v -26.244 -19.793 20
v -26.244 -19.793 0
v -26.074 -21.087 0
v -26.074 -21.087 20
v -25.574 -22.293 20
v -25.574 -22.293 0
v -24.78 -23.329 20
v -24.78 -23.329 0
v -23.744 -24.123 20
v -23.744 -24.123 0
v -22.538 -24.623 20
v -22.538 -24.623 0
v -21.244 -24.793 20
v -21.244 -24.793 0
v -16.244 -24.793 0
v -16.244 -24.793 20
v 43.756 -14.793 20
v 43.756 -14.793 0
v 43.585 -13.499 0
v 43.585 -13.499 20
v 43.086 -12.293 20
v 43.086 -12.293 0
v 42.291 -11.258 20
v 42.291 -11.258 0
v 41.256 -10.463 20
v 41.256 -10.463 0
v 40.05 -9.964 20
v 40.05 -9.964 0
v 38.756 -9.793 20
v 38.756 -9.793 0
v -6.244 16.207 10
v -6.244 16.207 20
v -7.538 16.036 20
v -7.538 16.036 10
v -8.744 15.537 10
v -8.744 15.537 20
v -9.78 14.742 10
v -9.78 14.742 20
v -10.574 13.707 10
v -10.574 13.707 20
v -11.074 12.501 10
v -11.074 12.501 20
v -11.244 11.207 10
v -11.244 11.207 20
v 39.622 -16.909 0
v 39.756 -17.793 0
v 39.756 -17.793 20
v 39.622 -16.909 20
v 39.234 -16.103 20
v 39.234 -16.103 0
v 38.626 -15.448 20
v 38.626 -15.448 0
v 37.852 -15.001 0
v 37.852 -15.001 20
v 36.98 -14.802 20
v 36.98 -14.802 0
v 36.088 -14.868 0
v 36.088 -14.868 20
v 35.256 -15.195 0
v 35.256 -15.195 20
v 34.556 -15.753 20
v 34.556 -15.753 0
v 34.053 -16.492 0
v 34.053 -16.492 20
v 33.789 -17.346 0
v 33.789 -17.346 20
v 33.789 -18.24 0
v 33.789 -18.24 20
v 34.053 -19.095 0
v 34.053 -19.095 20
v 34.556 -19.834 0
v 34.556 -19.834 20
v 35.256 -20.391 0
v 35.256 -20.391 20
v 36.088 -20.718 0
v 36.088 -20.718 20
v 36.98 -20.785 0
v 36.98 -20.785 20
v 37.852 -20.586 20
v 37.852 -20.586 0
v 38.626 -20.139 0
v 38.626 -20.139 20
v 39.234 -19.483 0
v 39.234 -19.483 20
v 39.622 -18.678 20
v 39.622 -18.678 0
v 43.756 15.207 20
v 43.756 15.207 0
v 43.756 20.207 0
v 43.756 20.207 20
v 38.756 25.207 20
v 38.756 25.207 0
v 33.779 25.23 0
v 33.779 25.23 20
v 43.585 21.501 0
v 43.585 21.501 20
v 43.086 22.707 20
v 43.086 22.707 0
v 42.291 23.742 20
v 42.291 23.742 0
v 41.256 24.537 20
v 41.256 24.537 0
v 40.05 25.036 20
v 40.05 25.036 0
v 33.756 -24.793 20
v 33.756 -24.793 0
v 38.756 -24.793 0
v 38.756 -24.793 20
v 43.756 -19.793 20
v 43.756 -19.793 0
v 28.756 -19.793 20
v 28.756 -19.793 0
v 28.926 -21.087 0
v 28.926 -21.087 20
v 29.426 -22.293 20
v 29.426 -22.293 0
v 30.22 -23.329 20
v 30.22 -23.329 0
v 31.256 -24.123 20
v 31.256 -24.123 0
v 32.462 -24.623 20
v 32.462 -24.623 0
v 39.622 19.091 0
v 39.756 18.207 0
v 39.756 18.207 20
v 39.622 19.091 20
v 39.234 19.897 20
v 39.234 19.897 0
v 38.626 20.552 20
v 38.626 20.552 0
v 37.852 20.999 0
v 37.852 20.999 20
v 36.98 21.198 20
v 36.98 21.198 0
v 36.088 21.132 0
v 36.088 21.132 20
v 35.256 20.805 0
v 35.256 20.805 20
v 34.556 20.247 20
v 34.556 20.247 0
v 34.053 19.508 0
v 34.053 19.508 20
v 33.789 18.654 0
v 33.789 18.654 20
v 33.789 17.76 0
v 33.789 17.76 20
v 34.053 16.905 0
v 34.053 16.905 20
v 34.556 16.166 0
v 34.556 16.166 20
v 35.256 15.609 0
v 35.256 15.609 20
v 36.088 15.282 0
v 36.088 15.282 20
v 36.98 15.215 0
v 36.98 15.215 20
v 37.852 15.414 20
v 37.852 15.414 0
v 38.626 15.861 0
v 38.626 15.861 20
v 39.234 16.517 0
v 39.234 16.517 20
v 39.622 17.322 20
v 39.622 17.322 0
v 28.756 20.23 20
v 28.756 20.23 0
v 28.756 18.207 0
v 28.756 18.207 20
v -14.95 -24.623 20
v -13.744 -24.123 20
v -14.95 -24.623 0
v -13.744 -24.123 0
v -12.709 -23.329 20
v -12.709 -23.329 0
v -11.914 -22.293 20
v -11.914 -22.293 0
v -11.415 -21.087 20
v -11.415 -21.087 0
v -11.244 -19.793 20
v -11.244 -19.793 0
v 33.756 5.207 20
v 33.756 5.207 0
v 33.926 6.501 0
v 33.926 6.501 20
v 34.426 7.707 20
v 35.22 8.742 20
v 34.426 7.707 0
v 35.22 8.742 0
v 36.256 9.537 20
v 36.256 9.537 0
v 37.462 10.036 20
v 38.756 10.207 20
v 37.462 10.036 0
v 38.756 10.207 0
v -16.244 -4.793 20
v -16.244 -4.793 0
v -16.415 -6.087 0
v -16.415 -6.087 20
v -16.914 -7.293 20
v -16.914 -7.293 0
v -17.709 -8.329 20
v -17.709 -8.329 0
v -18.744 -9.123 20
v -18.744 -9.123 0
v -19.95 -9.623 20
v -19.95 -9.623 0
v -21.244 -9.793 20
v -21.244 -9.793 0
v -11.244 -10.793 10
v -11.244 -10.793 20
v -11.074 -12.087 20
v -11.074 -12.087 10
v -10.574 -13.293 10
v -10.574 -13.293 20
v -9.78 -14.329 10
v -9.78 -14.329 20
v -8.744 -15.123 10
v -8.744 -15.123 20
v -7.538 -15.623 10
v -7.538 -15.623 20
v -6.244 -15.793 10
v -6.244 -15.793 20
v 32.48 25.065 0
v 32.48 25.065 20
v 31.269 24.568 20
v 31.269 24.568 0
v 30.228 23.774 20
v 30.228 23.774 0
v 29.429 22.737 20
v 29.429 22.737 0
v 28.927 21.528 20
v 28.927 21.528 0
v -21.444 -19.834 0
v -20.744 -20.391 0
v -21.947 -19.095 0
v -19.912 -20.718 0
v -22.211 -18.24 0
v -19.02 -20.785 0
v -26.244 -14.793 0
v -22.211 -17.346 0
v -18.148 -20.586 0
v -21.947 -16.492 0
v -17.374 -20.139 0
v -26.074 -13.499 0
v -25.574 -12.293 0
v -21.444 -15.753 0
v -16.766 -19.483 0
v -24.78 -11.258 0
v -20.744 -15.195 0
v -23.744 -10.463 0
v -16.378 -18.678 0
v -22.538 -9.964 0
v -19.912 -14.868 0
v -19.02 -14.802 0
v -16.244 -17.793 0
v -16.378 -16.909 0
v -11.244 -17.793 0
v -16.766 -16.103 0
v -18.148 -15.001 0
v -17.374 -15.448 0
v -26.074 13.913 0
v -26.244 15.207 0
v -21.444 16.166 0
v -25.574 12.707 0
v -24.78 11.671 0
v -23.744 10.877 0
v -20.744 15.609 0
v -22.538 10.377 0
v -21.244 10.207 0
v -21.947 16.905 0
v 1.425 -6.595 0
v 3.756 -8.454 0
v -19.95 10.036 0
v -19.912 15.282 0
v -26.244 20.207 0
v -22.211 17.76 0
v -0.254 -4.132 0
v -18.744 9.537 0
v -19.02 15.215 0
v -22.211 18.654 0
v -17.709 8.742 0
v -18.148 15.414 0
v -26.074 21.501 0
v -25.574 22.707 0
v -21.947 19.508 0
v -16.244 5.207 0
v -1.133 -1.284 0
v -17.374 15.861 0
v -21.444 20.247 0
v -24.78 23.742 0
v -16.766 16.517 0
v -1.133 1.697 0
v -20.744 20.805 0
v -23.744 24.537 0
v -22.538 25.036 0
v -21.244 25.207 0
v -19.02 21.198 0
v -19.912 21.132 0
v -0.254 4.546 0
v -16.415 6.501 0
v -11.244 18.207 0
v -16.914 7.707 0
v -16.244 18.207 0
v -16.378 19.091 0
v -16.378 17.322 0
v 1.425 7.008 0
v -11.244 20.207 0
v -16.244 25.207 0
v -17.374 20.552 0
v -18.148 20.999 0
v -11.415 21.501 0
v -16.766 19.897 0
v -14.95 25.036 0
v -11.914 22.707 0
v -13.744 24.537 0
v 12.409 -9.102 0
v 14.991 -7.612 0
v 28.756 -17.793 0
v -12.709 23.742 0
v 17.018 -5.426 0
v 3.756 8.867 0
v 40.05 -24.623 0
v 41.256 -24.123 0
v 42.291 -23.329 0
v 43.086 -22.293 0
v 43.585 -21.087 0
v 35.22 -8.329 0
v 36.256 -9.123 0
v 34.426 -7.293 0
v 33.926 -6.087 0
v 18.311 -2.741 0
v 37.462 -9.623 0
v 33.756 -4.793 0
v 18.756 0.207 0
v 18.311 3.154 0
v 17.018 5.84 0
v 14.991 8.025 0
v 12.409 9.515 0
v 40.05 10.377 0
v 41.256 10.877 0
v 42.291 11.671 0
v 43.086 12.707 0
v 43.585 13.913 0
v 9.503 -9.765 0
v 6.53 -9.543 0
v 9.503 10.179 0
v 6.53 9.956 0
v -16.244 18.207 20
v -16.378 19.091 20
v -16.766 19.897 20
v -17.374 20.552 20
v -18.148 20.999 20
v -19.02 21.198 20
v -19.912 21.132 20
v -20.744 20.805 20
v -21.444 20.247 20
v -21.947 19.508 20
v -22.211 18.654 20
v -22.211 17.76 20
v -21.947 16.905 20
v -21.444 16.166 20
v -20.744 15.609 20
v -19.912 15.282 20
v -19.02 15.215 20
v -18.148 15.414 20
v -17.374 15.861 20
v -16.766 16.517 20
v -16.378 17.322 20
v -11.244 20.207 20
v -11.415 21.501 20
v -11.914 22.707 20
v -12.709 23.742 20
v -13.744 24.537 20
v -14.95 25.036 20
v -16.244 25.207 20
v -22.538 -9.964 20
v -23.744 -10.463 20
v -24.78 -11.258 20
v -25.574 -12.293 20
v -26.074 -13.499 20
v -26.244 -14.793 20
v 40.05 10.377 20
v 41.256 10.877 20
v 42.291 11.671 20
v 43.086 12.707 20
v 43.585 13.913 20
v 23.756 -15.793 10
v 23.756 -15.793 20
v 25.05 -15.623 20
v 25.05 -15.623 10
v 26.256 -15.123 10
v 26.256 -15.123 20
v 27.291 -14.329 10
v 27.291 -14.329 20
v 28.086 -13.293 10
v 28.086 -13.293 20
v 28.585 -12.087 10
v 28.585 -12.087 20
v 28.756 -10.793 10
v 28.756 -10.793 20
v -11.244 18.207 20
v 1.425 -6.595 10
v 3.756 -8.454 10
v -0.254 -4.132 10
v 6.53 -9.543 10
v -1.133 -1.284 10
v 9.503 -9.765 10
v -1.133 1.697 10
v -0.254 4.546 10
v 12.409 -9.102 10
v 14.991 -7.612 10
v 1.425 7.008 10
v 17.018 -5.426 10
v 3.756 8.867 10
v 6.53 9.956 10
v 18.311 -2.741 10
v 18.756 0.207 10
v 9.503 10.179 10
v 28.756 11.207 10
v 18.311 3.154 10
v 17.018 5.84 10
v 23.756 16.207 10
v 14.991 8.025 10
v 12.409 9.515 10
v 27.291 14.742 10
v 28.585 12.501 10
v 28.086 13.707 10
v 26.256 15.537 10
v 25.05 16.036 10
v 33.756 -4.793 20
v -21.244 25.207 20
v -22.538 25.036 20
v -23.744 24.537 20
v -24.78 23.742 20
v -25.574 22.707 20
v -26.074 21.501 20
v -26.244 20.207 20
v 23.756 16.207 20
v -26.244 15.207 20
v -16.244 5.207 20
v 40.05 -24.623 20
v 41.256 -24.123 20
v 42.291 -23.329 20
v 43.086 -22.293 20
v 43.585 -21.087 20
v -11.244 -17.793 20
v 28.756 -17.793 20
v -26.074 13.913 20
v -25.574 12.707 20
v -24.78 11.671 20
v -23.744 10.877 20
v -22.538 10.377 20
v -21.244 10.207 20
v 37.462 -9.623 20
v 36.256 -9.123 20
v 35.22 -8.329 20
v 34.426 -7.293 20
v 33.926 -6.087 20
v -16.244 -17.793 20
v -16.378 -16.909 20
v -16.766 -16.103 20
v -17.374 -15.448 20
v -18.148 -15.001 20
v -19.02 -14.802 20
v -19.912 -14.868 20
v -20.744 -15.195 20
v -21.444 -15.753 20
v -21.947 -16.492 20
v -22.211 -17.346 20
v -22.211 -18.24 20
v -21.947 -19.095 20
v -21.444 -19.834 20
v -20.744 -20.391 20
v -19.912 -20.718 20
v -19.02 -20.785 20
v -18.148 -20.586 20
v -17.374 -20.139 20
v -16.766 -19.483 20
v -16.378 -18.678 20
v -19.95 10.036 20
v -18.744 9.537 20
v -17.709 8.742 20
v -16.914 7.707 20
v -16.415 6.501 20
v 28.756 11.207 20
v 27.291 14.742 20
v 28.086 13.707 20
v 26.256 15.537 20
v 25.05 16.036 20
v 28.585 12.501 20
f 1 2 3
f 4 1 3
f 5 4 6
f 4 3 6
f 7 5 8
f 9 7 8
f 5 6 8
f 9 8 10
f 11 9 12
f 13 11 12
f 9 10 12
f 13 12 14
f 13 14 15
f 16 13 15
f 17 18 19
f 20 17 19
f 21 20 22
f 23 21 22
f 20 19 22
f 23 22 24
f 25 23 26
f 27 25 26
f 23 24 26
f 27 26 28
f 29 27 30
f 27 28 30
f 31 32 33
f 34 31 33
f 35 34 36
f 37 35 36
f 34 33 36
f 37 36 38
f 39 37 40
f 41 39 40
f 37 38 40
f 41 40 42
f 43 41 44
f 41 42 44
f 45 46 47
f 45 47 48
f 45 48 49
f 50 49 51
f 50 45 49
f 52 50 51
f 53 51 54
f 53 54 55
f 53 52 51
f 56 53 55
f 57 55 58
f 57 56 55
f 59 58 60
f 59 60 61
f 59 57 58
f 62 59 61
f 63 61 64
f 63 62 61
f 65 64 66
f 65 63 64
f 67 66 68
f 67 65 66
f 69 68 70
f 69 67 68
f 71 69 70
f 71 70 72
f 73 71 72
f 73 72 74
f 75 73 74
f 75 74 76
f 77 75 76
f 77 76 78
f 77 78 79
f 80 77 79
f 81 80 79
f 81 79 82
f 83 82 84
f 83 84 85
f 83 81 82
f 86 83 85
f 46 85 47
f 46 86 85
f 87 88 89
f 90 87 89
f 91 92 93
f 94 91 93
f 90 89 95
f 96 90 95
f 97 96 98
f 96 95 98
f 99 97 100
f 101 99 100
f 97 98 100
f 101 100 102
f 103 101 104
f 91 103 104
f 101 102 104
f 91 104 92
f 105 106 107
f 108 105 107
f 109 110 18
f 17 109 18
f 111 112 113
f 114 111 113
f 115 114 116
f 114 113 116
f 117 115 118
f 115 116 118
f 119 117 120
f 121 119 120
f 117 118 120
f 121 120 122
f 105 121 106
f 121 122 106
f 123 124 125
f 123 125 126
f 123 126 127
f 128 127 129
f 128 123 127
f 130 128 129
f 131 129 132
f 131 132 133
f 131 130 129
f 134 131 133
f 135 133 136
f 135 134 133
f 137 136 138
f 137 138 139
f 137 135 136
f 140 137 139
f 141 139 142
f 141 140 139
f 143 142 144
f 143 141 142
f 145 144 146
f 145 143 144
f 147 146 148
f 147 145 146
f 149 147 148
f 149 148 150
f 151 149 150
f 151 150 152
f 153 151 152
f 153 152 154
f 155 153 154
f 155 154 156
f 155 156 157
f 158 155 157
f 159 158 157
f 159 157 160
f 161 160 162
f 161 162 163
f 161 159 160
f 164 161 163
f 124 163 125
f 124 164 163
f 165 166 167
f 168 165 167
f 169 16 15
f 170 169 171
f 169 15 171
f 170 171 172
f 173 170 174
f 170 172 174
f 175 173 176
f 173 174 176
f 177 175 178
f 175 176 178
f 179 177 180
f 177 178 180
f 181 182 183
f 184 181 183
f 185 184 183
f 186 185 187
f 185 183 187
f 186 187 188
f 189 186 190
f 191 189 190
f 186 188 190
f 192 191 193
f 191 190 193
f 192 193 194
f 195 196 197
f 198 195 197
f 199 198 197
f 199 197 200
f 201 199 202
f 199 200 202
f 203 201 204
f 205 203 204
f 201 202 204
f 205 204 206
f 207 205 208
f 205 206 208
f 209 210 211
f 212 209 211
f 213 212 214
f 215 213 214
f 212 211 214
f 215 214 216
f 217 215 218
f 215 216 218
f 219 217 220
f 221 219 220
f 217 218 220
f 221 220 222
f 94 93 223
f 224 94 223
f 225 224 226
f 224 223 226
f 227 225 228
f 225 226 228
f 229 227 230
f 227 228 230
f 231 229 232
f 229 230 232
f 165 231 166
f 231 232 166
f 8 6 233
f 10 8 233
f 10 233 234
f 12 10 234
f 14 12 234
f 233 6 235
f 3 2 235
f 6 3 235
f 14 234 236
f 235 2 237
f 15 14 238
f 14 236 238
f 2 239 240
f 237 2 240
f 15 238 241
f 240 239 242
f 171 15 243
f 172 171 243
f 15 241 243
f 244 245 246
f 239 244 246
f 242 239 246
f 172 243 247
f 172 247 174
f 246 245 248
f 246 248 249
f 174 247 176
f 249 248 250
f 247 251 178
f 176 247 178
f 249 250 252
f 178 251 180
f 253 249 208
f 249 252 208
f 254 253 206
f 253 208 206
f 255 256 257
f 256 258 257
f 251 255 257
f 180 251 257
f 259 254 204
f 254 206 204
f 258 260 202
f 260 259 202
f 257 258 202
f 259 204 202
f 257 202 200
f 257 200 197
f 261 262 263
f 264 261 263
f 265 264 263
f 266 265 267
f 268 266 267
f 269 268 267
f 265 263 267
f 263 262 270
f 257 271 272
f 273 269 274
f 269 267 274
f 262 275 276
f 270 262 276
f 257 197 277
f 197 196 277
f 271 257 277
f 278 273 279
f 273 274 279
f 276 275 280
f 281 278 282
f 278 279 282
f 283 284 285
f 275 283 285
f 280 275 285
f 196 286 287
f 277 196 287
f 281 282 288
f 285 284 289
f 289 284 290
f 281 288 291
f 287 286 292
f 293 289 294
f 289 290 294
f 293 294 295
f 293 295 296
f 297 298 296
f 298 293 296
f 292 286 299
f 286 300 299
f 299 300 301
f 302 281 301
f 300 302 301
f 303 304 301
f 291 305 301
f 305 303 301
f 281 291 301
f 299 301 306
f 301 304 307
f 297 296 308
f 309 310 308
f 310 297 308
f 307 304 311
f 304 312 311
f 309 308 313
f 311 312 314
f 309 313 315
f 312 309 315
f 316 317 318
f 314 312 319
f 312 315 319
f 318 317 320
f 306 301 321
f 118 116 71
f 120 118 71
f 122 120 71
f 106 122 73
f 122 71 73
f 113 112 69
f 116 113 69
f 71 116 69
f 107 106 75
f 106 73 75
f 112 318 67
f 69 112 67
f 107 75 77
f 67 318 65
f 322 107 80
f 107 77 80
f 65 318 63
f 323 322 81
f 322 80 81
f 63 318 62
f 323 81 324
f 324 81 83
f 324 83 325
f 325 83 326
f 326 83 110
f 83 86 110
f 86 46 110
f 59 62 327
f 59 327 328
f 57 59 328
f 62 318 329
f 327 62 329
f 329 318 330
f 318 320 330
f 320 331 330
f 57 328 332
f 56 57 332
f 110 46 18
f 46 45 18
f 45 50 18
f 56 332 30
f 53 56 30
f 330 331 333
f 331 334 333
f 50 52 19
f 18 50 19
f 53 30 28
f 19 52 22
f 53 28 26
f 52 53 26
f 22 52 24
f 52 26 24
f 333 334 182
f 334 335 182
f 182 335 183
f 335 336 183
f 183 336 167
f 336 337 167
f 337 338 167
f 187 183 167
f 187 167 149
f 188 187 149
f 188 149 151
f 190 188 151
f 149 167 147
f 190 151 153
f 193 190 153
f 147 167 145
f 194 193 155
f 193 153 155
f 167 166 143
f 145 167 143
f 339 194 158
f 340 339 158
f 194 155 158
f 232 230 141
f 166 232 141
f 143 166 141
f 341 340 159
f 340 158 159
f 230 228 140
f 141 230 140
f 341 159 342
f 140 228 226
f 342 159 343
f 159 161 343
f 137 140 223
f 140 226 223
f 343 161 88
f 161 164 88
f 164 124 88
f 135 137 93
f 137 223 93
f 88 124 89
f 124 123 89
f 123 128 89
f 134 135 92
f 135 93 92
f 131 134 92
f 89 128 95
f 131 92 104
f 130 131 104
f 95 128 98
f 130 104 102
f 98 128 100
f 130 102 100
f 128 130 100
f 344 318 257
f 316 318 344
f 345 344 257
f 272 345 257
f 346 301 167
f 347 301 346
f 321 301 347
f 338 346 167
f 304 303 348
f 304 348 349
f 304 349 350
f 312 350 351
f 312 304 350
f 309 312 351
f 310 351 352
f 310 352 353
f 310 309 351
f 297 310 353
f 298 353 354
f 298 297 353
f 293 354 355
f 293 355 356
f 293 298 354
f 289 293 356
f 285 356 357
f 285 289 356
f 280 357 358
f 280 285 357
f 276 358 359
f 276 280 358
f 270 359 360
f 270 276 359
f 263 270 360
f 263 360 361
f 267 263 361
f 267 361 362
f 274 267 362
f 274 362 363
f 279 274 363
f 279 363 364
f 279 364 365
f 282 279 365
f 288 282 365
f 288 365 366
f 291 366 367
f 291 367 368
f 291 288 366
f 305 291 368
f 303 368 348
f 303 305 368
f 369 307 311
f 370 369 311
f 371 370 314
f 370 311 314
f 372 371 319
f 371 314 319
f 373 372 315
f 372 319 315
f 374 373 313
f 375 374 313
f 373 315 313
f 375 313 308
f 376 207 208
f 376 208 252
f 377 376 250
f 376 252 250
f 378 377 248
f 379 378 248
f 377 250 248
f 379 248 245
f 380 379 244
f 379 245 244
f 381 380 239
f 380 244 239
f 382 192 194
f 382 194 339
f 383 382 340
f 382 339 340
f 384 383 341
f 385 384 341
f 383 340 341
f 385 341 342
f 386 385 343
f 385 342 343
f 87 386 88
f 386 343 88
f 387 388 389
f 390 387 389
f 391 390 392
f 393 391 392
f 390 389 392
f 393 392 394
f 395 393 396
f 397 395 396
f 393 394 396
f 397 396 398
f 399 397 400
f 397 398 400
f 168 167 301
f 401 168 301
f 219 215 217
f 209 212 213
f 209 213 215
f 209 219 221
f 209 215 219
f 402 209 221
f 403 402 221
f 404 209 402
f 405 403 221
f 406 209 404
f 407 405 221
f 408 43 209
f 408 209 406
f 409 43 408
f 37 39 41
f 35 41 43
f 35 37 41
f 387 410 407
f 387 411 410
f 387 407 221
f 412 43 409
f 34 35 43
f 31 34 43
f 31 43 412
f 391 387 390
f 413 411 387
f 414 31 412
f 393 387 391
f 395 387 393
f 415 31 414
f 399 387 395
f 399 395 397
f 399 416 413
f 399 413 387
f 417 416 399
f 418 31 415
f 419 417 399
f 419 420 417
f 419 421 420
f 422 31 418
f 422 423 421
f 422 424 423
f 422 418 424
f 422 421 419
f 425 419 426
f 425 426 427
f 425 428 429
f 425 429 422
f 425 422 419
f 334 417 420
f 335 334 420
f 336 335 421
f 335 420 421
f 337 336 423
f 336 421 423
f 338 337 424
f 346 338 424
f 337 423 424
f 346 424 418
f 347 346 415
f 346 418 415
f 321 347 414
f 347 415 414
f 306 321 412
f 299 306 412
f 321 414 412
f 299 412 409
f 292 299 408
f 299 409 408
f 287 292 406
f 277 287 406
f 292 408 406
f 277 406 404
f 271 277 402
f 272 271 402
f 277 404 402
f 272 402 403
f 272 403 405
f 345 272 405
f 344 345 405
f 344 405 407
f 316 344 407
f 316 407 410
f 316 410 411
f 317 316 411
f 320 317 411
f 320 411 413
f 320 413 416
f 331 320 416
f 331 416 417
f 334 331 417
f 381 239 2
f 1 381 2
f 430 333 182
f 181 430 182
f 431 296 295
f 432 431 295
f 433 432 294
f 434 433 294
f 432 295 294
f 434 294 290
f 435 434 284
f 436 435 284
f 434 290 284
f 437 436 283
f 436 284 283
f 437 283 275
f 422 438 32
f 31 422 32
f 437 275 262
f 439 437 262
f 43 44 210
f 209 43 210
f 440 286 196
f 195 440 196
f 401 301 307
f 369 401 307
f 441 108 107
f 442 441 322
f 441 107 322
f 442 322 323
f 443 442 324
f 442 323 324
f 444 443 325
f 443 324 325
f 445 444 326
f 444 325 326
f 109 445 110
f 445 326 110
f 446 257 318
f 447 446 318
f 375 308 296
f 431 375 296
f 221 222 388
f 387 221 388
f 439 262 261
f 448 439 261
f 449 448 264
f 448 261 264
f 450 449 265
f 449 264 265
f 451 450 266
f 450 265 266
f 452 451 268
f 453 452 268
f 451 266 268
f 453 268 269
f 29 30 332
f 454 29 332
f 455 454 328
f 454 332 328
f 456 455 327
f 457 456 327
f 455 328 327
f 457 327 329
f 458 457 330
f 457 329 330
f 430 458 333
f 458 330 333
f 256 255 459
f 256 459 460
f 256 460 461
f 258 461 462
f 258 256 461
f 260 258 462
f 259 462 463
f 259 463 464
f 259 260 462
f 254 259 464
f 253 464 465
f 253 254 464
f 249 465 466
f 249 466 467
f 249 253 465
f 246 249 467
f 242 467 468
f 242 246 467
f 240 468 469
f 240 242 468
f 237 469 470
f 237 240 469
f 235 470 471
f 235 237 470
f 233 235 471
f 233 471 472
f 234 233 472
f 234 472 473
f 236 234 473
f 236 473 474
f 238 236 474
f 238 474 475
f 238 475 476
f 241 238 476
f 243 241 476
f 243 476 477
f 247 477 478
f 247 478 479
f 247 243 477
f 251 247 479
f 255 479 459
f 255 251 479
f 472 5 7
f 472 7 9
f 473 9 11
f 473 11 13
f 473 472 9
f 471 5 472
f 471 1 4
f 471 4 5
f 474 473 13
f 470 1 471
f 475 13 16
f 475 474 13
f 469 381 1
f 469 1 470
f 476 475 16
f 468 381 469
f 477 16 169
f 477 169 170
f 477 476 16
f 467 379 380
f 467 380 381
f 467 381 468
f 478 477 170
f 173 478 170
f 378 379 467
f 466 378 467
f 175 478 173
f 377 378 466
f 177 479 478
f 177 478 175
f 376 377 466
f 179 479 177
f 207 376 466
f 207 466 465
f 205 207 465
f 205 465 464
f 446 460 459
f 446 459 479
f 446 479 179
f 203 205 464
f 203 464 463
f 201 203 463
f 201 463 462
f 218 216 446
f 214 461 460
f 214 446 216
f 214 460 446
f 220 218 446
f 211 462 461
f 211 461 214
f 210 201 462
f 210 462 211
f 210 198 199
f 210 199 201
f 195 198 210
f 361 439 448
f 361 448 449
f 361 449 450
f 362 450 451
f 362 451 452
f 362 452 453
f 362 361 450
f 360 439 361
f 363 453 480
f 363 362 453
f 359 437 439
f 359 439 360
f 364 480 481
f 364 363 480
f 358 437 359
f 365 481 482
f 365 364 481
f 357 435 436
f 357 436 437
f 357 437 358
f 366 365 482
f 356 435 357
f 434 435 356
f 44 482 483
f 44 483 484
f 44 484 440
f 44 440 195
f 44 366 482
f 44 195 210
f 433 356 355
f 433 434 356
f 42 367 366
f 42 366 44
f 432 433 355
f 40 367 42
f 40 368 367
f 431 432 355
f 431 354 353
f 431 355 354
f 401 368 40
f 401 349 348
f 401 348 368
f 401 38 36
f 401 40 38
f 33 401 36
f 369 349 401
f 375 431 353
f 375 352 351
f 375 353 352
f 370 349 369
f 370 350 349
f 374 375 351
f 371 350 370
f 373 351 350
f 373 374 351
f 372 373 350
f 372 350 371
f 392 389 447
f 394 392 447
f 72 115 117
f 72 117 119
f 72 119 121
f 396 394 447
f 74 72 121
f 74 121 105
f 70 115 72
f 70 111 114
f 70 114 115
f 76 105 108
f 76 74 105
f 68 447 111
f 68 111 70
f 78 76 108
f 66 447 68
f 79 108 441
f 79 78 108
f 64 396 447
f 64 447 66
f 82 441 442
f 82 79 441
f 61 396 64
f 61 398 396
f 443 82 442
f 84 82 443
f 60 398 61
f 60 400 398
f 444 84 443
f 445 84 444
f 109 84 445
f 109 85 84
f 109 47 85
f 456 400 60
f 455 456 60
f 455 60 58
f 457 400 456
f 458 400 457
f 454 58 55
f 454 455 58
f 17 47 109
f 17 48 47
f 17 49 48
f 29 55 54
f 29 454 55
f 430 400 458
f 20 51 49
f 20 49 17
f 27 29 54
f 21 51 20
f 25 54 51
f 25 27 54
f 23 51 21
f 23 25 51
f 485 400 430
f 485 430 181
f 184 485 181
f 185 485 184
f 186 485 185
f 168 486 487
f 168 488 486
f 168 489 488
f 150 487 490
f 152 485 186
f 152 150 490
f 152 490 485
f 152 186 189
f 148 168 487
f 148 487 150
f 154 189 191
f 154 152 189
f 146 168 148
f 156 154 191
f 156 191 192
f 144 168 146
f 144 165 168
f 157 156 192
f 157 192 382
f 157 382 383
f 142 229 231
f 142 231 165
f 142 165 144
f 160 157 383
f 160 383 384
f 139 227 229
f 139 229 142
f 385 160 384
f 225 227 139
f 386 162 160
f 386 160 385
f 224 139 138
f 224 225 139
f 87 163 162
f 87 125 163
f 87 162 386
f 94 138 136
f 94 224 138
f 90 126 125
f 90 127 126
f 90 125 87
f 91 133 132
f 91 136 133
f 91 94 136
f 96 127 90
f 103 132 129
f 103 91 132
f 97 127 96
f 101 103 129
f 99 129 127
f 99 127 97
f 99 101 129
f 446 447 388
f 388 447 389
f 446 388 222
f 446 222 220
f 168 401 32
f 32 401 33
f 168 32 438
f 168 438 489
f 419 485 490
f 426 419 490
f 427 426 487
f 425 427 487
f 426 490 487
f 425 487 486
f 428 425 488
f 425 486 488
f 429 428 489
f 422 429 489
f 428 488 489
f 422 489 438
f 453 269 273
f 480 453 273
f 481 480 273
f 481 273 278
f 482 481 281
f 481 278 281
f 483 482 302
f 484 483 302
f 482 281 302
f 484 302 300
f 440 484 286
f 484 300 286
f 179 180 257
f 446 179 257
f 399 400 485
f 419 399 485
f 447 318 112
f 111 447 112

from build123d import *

# Parameters (mm, degrees)
F0_R     = 3
F1_DEPTH = 20
F3_DEPTH = 10
F4_R     = 10
F5_DEPTH = 20


with BuildPart() as f1:
    # F0 (on Top) → F1 (new body)
    with BuildSketch(Plane.XY):
        with BuildLine():
            Line((-16.244364, 25.206749), (-21.244364, 25.206749))
            ThreePointArc((-21.244364, 25.206749), (-24.779898, 23.742283), (-26.244364, 20.206749))
            Line((-26.244364, 20.206749), (-26.244364, 15.206749))
            ThreePointArc((-26.244364, 15.206749), (-24.779898, 11.671215), (-21.244364, 10.206749))
            ThreePointArc((-21.244364, 10.206749), (-17.70883, 8.742283), (-16.244364, 5.206749))
            Line((-16.244364, 5.206749), (-16.244364, -4.793251))
            ThreePointArc((-16.244364, -4.793251), (-17.70883, -8.328785), (-21.244364, -9.793251))
            ThreePointArc((-21.244364, -9.793251), (-24.779898, -11.257717), (-26.244364, -14.793251))
            Line((-26.244364, -14.793251), (-26.244364, -19.793251))
            ThreePointArc((-26.244364, -19.793251), (-24.779898, -23.328785), (-21.244364, -24.793251))
            Line((-21.244364, -24.793251), (-16.244364, -24.793251))
            ThreePointArc((-16.244364, -24.793251), (-12.70883, -23.328785), (-11.244364, -19.793251))
            Line((-11.244364, -19.793251), (-11.244364, -17.793251))
            Line((-11.244364, -17.793251), (28.755636, -17.793251))
            Line((28.755636, -17.793251), (28.755636, -19.793251))
            ThreePointArc((28.755636, -19.793251), (30.220102, -23.328785), (33.755636, -24.793251))
            Line((33.755636, -24.793251), (38.755636, -24.793251))
            ThreePointArc((38.755636, -24.793251), (42.29117, -23.328785), (43.755636, -19.793251))
            Line((43.755636, -19.793251), (43.755636, -14.793251))
            ThreePointArc((43.755636, -14.793251), (42.29117, -11.257717), (38.755636, -9.793251))
            ThreePointArc((38.755636, -9.793251), (35.220102, -8.328785), (33.755636, -4.793251))
            Line((33.755636, -4.793251), (33.755636, 5.206749))
            ThreePointArc((33.755636, 5.206749), (35.220102, 8.742283), (38.755636, 10.206749))
            ThreePointArc((38.755636, 10.206749), (42.29117, 11.671215), (43.755636, 15.206749))
            Line((43.755636, 15.206749), (43.755636, 20.206749))
            ThreePointArc((43.755636, 20.206749), (42.29117, 23.742283), (38.755636, 25.206749))
            Line((38.755636, 25.206749), (33.778906, 25.229911))
            ThreePointArc((33.778906, 25.229911), (30.228339, 23.773717), (28.755636, 20.229966))
            Line((28.755636, 20.229966), (28.755636, 18.206749))
            Line((28.755636, 18.206749), (-11.244364, 18.206749))
            Line((-11.244364, 18.206749), (-11.244364, 20.206749))
            ThreePointArc((-11.244364, 20.206749), (-12.70883, 23.742283), (-16.244364, 25.206749))
        make_face()
        with Locations((-19.244364, -17.793251)):
            Circle(F0_R, mode=Mode.SUBTRACT)
        with Locations((36.755636, -17.793251)):
            Circle(F0_R, mode=Mode.SUBTRACT)
        with Locations((-19.244364, 18.206749)):
            Circle(F0_R, mode=Mode.SUBTRACT)
        with Locations((36.755636, 18.206749)):
            Circle(F0_R, mode=Mode.SUBTRACT)
    extrude(amount=F1_DEPTH)

    # F2 (on face) → F3 (cut)
    with BuildSketch(Plane.XY.offset(20)):
        with BuildLine():
            Line((23.755636, 16.206749), (-6.244364, 16.206749))
            ThreePointArc((-6.244364, 16.206749), (-9.779898, 14.742283), (-11.244364, 11.206749))
            Line((-11.244364, 11.206749), (-11.244364, -10.793251))
            ThreePointArc((-11.244364, -10.793251), (-9.779898, -14.328785), (-6.244364, -15.793251))
            Line((-6.244364, -15.793251), (23.755636, -15.793251))
            ThreePointArc((23.755636, -15.793251), (27.29117, -14.328785), (28.755636, -10.793251))
            Line((28.755636, -10.793251), (28.755636, 11.206749))
            ThreePointArc((28.755636, 11.206749), (27.29117, 14.742283), (23.755636, 16.206749))
        make_face()
    extrude(amount=-F3_DEPTH, mode=Mode.SUBTRACT)

    # F4 (on face) → F5 (cut)
    with BuildSketch(Plane.XY.offset(10)):
        with Locations((8.755636, 0.206749)):
            Circle(F4_R)
    extrude(amount=-F5_DEPTH, mode=Mode.SUBTRACT)


solid = f1.part
